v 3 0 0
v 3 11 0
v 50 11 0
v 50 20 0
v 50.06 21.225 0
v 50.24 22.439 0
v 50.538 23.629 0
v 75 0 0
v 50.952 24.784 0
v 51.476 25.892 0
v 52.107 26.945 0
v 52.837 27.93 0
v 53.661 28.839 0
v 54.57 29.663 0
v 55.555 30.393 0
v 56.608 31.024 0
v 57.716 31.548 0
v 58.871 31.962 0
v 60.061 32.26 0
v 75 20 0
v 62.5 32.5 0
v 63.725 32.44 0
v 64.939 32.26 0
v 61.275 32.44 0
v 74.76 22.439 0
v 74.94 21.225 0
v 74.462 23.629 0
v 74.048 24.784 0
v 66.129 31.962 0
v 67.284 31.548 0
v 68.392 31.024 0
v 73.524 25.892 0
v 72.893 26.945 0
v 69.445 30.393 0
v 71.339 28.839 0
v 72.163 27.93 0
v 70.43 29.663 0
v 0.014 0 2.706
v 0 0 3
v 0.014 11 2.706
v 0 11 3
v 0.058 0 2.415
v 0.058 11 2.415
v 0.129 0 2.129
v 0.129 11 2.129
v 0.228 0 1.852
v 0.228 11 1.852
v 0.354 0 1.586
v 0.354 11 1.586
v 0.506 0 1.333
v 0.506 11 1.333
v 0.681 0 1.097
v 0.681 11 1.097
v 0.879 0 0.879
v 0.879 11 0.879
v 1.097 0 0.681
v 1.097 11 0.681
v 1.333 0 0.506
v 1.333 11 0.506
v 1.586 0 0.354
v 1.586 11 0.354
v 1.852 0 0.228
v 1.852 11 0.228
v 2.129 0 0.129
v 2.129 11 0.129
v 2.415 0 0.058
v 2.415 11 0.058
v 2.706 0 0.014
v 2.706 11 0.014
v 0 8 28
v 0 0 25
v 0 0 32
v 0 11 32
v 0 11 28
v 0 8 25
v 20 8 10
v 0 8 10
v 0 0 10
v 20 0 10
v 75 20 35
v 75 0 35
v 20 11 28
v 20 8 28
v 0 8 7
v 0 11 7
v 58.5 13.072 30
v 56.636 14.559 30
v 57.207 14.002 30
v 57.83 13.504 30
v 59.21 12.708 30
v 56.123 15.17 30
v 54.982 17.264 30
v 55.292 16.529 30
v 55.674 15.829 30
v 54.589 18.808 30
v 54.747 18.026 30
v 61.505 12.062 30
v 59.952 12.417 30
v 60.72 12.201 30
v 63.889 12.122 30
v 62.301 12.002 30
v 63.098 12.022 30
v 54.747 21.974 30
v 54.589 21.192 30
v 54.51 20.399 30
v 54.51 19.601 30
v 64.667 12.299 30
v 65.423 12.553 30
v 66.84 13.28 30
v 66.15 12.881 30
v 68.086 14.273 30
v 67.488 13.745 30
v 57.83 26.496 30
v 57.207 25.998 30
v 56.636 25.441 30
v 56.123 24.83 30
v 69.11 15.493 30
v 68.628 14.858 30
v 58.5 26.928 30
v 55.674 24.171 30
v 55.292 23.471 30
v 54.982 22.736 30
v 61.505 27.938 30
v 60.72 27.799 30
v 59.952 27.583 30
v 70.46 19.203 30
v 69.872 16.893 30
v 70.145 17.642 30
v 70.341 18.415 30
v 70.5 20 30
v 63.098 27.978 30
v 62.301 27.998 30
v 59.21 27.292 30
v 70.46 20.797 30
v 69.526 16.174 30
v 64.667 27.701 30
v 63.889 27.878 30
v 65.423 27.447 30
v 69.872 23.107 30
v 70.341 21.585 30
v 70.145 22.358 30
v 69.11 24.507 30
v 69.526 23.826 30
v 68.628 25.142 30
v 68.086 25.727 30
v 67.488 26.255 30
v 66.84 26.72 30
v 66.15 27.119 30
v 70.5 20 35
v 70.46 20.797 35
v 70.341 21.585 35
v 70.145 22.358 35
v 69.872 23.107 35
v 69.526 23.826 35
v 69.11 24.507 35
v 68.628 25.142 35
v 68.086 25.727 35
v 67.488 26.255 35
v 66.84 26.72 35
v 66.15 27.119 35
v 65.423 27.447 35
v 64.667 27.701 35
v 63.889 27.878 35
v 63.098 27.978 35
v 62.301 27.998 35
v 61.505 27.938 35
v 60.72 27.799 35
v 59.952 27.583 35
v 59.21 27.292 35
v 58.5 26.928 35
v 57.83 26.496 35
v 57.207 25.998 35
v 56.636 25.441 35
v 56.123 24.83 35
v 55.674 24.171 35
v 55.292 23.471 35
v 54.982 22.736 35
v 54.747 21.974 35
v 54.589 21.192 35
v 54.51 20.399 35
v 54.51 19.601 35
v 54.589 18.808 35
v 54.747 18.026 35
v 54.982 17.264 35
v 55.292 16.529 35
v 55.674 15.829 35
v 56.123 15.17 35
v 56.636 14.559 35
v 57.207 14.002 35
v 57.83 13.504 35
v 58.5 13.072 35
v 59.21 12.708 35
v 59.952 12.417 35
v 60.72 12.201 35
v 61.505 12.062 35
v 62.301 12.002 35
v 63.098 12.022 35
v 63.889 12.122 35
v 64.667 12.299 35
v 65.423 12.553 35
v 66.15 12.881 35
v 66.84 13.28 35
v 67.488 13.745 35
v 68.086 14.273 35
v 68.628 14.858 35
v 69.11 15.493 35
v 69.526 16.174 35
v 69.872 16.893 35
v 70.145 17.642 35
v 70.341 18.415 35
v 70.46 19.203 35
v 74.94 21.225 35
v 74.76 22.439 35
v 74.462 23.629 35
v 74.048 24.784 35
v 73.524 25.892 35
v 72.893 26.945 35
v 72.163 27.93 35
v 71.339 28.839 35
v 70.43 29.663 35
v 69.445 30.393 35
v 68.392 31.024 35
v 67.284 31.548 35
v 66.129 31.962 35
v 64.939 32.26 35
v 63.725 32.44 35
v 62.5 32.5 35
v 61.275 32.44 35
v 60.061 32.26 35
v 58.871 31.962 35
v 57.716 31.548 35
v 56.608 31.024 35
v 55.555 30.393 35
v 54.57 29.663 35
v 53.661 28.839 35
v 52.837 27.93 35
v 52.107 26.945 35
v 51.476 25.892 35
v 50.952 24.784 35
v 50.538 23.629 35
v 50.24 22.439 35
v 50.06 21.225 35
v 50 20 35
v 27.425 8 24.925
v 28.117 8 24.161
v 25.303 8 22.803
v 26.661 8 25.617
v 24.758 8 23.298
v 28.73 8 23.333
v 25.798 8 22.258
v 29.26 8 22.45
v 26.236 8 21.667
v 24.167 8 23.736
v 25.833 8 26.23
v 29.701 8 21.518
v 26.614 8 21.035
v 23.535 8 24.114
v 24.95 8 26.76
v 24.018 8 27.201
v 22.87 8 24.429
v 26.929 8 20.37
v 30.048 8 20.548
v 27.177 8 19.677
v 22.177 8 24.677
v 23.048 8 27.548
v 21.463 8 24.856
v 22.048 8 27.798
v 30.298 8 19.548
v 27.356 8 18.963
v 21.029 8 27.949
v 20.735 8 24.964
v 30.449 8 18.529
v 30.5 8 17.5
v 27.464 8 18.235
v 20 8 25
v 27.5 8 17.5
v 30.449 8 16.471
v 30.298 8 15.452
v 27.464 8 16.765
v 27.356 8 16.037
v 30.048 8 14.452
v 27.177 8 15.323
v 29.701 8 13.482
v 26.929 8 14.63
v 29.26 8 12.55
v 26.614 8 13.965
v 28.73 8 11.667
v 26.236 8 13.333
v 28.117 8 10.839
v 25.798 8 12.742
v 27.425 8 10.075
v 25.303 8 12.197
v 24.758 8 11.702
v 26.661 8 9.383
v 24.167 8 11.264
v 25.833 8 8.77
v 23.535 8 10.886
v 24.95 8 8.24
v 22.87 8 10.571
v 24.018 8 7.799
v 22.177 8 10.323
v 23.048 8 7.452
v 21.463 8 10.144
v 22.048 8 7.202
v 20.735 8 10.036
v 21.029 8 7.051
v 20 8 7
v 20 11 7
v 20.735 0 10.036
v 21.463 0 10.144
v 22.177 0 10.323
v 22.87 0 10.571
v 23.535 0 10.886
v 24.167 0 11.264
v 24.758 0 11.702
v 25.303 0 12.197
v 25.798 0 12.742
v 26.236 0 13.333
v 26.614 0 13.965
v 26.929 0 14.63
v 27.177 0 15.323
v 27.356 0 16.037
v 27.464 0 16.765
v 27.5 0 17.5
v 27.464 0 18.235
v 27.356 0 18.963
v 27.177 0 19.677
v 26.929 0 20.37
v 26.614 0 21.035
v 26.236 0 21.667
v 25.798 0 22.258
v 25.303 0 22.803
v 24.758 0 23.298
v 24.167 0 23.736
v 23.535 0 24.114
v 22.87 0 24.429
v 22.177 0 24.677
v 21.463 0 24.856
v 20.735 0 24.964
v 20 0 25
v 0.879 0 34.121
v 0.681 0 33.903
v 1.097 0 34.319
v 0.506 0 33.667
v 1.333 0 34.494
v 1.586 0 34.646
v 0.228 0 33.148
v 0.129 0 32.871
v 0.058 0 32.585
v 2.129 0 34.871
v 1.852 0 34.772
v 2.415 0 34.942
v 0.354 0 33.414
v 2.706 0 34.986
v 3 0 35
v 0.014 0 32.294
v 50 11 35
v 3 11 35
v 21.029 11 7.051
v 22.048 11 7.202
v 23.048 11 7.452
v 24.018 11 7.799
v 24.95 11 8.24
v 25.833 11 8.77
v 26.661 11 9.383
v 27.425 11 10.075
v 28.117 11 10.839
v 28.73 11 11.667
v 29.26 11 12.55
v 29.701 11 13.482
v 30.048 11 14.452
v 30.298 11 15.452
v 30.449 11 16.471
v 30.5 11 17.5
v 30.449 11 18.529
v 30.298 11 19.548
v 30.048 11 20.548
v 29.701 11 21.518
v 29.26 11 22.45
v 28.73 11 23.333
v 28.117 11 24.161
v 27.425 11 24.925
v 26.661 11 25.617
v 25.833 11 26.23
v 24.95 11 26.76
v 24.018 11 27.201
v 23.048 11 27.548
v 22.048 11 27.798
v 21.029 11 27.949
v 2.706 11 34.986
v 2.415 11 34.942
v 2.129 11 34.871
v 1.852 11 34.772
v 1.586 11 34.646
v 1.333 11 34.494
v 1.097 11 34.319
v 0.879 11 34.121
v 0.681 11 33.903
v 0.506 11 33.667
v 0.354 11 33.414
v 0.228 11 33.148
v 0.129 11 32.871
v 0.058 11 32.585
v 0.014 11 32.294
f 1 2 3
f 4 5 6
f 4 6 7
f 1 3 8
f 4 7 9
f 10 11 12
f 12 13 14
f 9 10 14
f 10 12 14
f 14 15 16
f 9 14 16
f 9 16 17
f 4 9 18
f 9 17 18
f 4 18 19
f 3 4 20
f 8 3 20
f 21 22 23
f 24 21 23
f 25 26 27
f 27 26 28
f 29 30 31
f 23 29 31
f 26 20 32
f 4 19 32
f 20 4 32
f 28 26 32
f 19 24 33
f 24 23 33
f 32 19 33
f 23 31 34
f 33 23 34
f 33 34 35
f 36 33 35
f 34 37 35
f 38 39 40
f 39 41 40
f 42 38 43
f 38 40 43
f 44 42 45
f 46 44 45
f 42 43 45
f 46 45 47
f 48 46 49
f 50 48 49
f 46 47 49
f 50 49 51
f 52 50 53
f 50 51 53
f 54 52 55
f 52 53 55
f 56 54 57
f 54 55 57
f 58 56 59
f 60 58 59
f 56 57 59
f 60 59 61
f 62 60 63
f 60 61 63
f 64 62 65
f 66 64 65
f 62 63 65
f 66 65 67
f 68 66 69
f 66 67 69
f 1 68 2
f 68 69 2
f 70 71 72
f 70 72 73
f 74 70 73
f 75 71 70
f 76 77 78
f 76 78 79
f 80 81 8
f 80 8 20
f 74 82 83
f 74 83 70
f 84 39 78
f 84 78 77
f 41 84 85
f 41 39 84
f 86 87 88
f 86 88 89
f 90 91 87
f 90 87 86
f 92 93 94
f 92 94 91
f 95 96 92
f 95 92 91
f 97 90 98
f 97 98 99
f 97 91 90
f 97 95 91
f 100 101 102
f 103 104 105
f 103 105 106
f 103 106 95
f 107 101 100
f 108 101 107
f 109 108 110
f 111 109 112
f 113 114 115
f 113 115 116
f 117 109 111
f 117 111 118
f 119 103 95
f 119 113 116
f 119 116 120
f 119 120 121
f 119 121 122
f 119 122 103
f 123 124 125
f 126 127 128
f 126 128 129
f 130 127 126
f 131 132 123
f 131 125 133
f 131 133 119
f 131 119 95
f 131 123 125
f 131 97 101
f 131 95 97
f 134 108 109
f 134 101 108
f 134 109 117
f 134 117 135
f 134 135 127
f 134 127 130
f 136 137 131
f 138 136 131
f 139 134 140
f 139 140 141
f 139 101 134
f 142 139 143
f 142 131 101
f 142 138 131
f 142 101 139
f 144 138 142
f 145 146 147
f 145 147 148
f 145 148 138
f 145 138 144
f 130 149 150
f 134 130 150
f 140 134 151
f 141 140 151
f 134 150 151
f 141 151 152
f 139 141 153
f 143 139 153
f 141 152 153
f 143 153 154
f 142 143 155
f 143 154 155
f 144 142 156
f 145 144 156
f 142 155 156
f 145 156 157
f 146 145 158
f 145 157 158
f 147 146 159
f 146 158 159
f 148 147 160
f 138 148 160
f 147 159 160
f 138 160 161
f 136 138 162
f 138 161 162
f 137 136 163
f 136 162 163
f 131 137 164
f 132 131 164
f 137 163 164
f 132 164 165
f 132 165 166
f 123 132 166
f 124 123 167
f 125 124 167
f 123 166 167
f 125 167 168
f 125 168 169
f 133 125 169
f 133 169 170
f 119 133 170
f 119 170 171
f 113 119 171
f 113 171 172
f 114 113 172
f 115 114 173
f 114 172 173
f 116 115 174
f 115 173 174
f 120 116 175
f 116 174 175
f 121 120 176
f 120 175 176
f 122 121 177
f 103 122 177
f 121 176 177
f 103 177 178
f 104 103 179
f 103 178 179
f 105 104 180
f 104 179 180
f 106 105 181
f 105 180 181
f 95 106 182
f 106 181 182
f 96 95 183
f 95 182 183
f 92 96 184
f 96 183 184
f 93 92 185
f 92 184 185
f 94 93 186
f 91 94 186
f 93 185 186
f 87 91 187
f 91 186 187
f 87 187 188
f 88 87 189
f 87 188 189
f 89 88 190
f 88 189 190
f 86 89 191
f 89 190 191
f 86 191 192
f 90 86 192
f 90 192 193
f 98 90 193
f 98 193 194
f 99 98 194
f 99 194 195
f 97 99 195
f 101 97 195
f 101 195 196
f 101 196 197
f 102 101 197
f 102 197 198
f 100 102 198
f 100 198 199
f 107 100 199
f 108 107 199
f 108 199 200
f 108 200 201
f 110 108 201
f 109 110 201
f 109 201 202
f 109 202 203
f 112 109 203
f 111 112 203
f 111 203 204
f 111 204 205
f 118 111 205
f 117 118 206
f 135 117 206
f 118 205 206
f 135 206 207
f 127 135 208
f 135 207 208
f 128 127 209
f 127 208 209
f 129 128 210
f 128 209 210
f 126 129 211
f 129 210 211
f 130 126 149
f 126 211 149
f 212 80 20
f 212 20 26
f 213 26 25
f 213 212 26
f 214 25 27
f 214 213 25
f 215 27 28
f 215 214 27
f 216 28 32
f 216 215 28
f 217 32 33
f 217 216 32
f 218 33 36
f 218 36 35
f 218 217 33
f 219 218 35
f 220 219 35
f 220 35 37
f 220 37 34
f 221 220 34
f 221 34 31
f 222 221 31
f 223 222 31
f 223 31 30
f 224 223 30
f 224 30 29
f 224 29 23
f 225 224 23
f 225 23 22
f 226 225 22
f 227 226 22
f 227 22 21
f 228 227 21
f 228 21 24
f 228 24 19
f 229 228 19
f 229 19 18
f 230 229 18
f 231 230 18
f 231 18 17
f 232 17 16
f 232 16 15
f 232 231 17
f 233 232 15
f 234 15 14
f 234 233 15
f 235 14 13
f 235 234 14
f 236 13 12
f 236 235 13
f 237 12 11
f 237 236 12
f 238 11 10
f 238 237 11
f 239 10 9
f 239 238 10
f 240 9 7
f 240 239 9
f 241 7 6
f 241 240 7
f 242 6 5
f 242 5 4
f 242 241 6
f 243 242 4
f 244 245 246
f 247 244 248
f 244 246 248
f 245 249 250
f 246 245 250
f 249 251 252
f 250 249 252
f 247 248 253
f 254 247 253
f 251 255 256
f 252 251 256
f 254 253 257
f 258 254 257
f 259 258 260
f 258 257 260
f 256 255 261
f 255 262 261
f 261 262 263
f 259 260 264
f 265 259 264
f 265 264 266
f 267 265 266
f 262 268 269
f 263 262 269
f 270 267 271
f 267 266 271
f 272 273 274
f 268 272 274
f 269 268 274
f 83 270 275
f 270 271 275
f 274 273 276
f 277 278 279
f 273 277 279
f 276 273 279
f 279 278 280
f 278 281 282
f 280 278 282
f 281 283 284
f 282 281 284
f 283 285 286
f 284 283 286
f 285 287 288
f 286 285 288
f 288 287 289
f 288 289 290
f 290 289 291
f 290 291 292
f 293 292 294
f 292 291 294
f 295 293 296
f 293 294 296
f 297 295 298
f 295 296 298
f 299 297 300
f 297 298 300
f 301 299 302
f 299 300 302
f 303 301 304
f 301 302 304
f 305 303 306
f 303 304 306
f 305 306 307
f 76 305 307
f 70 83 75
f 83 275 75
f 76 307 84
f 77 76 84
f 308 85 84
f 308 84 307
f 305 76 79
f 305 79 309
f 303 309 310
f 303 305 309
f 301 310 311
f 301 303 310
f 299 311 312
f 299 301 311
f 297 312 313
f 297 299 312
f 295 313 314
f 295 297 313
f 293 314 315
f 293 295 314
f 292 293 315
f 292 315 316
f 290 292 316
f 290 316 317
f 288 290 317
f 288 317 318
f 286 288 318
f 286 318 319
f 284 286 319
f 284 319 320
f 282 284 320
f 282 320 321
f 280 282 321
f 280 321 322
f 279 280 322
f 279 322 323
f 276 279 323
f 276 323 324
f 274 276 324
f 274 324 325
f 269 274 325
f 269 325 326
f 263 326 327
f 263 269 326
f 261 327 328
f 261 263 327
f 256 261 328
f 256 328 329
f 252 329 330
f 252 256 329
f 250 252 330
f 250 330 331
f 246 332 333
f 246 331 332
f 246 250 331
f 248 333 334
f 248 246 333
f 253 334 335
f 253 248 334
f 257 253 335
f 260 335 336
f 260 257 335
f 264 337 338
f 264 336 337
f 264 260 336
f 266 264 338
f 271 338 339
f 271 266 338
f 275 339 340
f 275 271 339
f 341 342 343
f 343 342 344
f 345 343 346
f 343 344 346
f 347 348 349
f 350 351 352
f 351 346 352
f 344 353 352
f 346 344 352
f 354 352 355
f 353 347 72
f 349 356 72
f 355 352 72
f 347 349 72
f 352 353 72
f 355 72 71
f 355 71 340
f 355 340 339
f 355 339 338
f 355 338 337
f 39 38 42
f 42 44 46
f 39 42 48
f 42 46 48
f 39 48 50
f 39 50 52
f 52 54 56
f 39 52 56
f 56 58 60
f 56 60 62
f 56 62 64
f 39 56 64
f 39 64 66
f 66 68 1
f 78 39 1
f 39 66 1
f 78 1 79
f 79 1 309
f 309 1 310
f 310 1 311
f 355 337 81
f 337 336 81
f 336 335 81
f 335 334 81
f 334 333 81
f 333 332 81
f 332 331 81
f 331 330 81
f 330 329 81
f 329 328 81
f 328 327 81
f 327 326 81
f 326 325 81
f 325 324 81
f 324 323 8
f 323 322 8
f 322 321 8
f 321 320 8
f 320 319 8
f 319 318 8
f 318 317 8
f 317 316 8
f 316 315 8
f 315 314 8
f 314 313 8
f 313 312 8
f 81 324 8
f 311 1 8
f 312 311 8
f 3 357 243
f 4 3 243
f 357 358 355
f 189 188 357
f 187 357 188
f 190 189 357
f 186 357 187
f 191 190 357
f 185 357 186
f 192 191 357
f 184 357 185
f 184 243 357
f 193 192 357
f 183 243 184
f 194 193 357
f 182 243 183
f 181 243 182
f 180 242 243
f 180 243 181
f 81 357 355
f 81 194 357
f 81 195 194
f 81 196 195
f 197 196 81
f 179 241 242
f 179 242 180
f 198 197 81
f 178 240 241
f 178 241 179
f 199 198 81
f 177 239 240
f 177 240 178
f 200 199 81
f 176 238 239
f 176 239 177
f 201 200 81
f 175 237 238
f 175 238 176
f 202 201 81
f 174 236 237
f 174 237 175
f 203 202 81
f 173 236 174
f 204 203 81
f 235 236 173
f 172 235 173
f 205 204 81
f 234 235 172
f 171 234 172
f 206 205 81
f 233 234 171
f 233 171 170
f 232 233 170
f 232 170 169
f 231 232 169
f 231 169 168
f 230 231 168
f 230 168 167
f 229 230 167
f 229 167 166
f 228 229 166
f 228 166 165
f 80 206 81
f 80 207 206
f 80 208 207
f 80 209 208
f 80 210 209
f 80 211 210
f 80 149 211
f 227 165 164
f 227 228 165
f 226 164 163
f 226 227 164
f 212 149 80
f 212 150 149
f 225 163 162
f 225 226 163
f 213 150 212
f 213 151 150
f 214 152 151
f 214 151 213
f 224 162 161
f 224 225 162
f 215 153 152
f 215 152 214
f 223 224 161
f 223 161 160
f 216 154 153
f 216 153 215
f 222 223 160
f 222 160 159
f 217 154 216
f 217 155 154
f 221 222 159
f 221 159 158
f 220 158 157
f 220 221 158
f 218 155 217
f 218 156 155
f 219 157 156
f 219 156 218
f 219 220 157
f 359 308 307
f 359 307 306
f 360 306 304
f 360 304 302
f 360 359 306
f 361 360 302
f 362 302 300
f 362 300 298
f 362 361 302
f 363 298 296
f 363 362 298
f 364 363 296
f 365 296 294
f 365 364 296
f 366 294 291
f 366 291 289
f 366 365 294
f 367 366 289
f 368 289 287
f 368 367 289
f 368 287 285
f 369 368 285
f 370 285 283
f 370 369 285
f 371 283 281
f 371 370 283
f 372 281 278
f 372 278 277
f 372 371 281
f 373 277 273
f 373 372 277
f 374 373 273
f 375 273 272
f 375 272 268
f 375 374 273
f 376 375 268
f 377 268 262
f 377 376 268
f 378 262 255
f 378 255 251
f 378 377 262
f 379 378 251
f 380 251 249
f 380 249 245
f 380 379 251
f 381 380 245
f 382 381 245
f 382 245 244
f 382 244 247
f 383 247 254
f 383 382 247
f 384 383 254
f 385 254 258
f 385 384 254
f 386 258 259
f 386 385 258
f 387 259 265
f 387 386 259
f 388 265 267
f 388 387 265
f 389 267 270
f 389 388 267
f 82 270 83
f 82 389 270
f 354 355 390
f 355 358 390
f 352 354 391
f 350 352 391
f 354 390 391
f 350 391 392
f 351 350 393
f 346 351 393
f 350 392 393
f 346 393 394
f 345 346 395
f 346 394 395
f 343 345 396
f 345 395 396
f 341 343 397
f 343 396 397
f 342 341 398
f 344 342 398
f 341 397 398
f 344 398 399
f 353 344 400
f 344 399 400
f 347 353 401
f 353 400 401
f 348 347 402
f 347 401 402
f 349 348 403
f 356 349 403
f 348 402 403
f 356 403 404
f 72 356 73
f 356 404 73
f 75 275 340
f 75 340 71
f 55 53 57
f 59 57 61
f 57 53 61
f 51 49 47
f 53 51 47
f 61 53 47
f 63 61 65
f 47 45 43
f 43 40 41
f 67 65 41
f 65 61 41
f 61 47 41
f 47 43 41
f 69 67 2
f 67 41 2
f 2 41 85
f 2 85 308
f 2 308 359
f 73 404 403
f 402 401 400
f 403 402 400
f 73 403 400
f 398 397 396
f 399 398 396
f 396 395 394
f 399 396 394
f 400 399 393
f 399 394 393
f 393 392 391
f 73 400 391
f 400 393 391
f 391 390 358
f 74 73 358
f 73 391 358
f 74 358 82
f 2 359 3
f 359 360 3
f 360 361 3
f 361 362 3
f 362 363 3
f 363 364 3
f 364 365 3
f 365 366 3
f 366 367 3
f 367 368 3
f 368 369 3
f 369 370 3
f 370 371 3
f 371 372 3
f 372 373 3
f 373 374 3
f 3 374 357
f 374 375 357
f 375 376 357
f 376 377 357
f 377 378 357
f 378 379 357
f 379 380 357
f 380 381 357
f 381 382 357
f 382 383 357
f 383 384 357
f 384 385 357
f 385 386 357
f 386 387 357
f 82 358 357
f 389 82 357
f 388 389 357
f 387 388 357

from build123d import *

# Parameters (mm, degrees)
IZIM1_W                     = 75
IZIM1_H                     = 36
Y_KSEKLIK_EKSTR_ZYON1_DEPTH = 35
IZIM2_W                     = 50
IZIM2_H                     = 25
KES_EKSTR_ZYON1_DEPTH       = 36
IZIM6_R                     = 8
KES_EKSTR_ZYON3_DEPTH       = 5
KES_EKSTR_ZYON4_DEPTH       = 3
KES_EKSTR_ZYON5_DEPTH       = 26
KES_EKSTR_ZYON5_DEPTH_BACK  = 12
RADYUS2_R                   = 3
RADYUS3_R                   = 3
KES_EKSTR_ZYON7_DEPTH       = 36


with BuildPart() as part:
    # Çizim1 → Yükseklik-Ekstrüzyon1 (new body)
    with BuildSketch(Plane.XY):
        with Locations((37.5, 18)):
            Rectangle(IZIM1_W, IZIM1_H)
    extrude(amount=Y_KSEKLIK_EKSTR_ZYON1_DEPTH)

    # Çizim2 → Kes-Ekstrüzyon1 (cut, through all)
    with BuildSketch(Plane.XY.offset(35)):
        with Locations((25, 23.5)):
            Rectangle(IZIM2_W, IZIM2_H)
    extrude(amount=-KES_EKSTR_ZYON1_DEPTH, mode=Mode.SUBTRACT)

    # Çizim6 → Kes-Ekstrüzyon3 (cut)
    with BuildSketch(Plane.XY.offset(35)):
        with Locations((62.5, 20)):
            Circle(IZIM6_R)
    extrude(amount=-KES_EKSTR_ZYON3_DEPTH, mode=Mode.SUBTRACT)

    # Çizim7 → Kes-Ekstrüzyon4 (cut)
    with BuildSketch(Plane(origin=(0, 11, 0), x_dir=(1, 0, 0), z_dir=(0, 1, 0))):
        with BuildLine():
            Line((0, -7), (20, -7))
            ThreePointArc((20, -7), (30.5, -17.5), (20, -28))
            Line((20, -28), (0, -28))
            Line((0, -28), (0, -25))
            Line((0, -25), (20, -25))
            ThreePointArc((20, -25), (27.5, -17.5), (20, -10))
            Line((20, -10), (0, -10))
            Line((0, -10), (0, -7))
        make_face()
    extrude(amount=-KES_EKSTR_ZYON4_DEPTH, mode=Mode.SUBTRACT)

    # Çizim8 → Kes-Ekstrüzyon5 (cut, two sides)
    with BuildSketch(Plane(origin=(0, 11, 0), x_dir=(1, 0, 0), z_dir=(0, 1, 0))) as kes_ekstr_zyon5_sk:
        with BuildLine():
            Line((0, -10), (20, -10))
            ThreePointArc((20, -10), (27.5, -17.5), (20, -25))
            Line((20, -25), (0, -25))
            Line((0, -25), (0, -10))
        make_face()
    extrude(amount=KES_EKSTR_ZYON5_DEPTH, mode=Mode.SUBTRACT)
    extrude(kes_ekstr_zyon5_sk.sketch, amount=-KES_EKSTR_ZYON5_DEPTH_BACK, mode=Mode.SUBTRACT)

    # Radyus2
    radyus2_edges = [part.edges().sort_by_distance(p)[0] for p in [
        (0, 5.5, 0),
    ]]
    fillet(radyus2_edges, radius=RADYUS2_R)

    # Radyus3
    radyus3_edges = [part.edges().sort_by_distance(p)[0] for p in [
        (0, 5.5, 35),
    ]]
    fillet(radyus3_edges, radius=RADYUS3_R)

    # Çizim9 → Kes-Ekstrüzyon7 (cut, through all)
    with BuildSketch(Plane.XY.offset(35)):
        with BuildLine():
            Line((50, 20), (50, 36))
            Line((50, 36), (75, 36))
            Line((75, 36), (75, 20))
            ThreePointArc((75, 20), (62.5, 32.5), (50, 20))
        make_face()
    extrude(amount=-KES_EKSTR_ZYON7_DEPTH, mode=Mode.SUBTRACT)


solid = part.part
